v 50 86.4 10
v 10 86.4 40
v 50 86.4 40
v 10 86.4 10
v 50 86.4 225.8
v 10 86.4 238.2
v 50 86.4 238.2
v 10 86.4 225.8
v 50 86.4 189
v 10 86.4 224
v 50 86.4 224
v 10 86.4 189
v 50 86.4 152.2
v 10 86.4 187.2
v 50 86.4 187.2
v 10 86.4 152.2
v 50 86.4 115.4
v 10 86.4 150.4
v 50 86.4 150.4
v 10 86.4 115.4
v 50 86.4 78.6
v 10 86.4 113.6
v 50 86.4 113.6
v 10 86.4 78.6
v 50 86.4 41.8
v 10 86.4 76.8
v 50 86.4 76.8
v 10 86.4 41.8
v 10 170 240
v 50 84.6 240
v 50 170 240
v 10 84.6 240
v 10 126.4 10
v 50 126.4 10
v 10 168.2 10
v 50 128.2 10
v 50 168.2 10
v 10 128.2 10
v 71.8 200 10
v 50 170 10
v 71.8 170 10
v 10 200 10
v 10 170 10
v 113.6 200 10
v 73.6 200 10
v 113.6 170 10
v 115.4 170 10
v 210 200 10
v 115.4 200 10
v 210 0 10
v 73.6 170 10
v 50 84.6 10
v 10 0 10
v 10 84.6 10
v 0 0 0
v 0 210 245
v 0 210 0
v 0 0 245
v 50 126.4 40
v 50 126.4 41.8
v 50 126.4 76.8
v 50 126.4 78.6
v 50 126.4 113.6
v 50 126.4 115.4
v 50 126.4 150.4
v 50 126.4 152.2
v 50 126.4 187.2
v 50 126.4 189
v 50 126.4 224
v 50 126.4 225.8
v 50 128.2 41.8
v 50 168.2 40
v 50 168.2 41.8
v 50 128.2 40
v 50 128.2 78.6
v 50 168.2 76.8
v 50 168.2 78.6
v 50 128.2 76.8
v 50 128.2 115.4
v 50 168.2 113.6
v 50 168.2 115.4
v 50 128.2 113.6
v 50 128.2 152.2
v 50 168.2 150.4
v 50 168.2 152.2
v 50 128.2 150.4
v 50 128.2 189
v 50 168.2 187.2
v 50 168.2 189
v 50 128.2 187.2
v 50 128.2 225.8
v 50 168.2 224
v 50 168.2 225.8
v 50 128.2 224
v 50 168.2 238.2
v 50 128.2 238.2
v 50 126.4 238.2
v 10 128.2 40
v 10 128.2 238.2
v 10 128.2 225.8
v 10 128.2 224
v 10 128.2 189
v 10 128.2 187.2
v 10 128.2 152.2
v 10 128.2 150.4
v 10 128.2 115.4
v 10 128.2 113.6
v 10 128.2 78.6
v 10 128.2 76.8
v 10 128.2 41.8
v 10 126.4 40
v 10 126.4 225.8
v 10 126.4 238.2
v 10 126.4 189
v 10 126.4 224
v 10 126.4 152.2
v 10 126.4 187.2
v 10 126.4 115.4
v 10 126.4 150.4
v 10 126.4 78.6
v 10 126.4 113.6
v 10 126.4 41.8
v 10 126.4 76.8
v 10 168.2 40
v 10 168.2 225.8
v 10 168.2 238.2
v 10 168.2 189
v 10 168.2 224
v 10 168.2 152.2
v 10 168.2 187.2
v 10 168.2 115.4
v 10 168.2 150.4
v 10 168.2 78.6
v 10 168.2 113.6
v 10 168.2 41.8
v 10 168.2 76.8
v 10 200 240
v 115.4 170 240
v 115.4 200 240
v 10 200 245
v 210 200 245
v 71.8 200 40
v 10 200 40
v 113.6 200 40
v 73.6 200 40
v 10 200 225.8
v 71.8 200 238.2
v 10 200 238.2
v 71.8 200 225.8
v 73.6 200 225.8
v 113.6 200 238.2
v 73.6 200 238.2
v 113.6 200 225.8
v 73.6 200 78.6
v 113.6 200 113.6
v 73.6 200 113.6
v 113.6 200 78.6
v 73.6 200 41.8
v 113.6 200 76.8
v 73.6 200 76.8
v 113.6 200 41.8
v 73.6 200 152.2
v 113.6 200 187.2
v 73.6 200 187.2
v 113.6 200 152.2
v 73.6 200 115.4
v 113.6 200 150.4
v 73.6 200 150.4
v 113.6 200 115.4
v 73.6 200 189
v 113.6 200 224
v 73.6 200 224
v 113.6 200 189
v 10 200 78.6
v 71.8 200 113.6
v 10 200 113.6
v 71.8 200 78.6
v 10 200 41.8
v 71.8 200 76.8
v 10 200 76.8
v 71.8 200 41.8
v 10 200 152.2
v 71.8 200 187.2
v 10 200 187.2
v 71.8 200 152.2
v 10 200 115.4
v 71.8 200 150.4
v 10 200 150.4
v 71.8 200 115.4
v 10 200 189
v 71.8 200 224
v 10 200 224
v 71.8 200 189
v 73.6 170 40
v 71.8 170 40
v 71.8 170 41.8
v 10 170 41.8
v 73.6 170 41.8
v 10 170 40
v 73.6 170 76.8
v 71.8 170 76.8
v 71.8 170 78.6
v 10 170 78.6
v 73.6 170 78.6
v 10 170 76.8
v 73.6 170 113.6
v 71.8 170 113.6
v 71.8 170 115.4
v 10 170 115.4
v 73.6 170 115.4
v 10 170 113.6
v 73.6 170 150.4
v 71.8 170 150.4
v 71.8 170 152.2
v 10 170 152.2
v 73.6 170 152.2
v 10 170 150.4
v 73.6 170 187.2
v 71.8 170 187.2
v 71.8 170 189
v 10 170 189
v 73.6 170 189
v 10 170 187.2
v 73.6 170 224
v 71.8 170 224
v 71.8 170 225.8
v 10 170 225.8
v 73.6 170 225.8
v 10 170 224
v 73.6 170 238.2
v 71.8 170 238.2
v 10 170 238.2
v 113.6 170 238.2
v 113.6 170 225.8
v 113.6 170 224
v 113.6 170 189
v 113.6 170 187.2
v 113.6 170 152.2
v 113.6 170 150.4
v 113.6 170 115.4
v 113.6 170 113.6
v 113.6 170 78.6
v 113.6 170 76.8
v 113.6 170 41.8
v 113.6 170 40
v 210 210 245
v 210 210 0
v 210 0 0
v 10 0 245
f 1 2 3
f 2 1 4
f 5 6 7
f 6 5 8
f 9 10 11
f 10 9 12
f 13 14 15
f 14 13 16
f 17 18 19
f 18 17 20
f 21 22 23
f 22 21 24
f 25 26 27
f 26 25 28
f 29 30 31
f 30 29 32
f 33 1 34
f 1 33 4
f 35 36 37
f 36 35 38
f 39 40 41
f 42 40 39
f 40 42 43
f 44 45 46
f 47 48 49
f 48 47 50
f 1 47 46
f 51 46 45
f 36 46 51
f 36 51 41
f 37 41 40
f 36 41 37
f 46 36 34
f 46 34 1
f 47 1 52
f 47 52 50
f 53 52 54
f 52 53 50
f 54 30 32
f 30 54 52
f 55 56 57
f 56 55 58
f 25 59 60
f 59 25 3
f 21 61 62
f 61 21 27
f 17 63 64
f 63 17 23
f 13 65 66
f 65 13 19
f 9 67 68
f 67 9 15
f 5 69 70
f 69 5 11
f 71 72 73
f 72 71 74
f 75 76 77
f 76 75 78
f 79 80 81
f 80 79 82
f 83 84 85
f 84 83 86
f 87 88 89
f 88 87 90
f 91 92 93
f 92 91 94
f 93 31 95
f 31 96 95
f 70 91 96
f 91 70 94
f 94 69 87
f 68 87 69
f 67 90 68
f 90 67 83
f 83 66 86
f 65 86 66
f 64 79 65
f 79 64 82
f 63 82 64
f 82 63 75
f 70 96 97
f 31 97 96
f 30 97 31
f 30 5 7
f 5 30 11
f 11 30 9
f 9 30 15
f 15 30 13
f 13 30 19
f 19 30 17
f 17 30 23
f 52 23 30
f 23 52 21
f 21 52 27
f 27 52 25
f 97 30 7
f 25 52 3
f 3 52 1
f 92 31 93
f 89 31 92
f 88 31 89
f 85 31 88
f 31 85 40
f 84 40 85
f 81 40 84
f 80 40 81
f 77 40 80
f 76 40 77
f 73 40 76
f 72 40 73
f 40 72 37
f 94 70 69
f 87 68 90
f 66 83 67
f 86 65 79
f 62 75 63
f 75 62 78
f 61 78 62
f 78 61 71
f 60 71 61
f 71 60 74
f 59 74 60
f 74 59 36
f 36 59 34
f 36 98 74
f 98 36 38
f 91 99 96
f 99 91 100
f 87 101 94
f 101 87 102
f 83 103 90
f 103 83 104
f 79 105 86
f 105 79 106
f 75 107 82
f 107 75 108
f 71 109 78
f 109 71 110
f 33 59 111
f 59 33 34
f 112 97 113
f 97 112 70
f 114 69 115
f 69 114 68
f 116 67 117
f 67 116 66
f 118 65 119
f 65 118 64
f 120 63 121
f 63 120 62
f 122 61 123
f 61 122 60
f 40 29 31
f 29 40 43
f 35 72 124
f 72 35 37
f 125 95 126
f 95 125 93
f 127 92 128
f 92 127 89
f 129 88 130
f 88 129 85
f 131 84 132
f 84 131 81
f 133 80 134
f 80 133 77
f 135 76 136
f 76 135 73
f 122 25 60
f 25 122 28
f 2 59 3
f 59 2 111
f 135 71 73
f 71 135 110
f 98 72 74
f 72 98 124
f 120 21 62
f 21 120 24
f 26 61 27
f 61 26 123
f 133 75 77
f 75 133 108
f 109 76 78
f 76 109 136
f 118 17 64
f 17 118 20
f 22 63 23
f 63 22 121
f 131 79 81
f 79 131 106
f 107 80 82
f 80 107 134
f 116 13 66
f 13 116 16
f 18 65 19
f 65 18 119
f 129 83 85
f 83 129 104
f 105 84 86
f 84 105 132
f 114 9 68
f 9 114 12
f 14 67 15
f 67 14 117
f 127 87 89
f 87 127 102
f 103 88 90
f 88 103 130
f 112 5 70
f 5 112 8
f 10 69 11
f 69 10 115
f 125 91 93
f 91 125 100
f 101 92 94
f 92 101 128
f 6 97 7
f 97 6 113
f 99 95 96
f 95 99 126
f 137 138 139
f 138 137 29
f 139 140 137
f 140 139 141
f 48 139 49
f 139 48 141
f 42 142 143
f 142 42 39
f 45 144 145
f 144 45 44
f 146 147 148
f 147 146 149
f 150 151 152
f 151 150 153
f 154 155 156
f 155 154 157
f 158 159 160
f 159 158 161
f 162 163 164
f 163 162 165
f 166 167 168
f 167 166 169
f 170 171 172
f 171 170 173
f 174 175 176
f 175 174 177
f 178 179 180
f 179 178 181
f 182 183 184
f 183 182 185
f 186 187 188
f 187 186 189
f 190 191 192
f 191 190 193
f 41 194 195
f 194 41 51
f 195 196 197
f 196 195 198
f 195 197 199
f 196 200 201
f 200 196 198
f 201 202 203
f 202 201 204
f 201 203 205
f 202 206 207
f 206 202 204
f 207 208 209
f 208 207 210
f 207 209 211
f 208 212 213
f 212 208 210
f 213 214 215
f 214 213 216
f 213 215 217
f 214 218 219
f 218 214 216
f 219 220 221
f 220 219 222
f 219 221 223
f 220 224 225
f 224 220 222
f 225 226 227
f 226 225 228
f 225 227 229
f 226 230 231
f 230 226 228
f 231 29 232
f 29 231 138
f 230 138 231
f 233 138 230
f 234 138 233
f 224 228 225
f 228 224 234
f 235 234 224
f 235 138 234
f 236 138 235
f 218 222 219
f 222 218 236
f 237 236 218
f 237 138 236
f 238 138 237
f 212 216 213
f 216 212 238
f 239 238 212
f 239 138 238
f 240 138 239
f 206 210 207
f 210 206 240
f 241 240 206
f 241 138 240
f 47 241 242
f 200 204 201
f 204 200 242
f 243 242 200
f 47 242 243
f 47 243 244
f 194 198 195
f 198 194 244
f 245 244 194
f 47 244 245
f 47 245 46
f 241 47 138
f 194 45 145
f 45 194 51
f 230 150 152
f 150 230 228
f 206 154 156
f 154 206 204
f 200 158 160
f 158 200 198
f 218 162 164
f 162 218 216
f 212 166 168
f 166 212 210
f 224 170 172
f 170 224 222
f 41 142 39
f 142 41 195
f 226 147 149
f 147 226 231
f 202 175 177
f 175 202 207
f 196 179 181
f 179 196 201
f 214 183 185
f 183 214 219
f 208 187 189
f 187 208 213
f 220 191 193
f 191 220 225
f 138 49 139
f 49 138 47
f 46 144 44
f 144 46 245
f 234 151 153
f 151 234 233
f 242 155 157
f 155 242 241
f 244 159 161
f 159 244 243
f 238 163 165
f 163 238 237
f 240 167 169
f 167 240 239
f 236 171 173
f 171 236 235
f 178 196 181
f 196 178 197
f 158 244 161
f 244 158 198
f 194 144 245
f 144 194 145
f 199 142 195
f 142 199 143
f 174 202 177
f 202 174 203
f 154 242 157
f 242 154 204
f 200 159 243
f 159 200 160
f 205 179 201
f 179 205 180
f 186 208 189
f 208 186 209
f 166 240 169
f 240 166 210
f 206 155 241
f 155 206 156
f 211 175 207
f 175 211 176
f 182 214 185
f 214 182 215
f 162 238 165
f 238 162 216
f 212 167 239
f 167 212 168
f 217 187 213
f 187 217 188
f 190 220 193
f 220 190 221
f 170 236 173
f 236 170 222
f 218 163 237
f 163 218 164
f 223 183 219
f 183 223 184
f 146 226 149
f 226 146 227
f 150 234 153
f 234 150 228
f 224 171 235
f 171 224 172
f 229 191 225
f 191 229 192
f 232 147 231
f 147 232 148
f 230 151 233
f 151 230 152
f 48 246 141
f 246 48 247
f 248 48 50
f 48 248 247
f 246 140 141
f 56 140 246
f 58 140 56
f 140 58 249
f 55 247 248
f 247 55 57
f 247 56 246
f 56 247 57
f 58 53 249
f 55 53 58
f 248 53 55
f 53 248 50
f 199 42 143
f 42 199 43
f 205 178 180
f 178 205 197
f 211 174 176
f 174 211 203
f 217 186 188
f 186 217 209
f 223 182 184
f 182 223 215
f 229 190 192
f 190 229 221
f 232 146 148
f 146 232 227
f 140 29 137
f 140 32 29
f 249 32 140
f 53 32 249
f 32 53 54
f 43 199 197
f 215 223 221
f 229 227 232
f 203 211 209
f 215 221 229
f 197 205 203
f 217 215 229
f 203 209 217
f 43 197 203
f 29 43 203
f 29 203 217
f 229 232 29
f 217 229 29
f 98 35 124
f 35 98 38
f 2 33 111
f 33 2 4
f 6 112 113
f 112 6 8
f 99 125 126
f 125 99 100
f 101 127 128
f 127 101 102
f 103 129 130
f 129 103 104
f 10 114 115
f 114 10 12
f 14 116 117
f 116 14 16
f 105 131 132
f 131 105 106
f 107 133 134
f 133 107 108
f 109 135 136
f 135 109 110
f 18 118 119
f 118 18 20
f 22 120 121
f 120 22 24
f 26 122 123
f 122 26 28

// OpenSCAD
translate([0.0, 0.0, 0.0]) color([0.0, 1.0, 0.25]) translate([50.0, 84.6, 10.0]) rotate([0.0, 0.0, 90.0]) union() {
union() {
union() {
translate([0.9, 25.0, 115.0]) cube([1.8, 50.0, 230.0], center = true);
translate([42.699999999999996, 25.0, 115.0]) cube([1.8, 50.0, 230.0], center = true);
translate([84.5, 25.0, 115.0]) cube([1.8, 50.0, 230.0], center = true);
}
translate([42.7, 25.0, 229.1]) cube([85.4, 50.0, 1.8], center = true);
union() {
translate([21.8, 25.0, 30.9]) cube([40.0, 50.0, 1.8], center = true);
translate([63.599999999999994, 25.0, 30.9]) cube([40.0, 50.0, 1.8], center = true);
translate([21.8, 25.0, 67.7]) cube([40.0, 50.0, 1.8], center = true);
translate([63.599999999999994, 25.0, 67.7]) cube([40.0, 50.0, 1.8], center = true);
translate([21.8, 25.0, 104.5]) cube([40.0, 50.0, 1.8], center = true);
translate([63.599999999999994, 25.0, 104.5]) cube([40.0, 50.0, 1.8], center = true);
translate([21.8, 25.0, 141.29999999999998]) cube([40.0, 50.0, 1.8], center = true);
translate([63.599999999999994, 25.0, 141.29999999999998]) cube([40.0, 50.0, 1.8], center = true);
translate([21.8, 25.0, 178.1]) cube([40.0, 50.0, 1.8], center = true);
translate([63.599999999999994, 25.0, 178.1]) cube([40.0, 50.0, 1.8], center = true);
translate([21.8, 25.0, 214.9]) cube([40.0, 50.0, 1.8], center = true);
translate([63.599999999999994, 25.0, 214.9]) cube([40.0, 50.0, 1.8], center = true);
}
}
translate([85.4, 50.0, 0.0]) rotate([0.0, 0.0, -90.0]) union() {
union() {
translate([0.9, 15.0, 115.0]) cube([1.8, 30.0, 230.0], center = true);
translate([72.7, 15.0, 115.0]) cube([1.8, 30.0, 230.0], center = true);
translate([114.5, 15.0, 115.0]) cube([1.8, 30.0, 230.0], center = true);
}
translate([57.7, 15.0, 229.1]) cube([115.4, 30.0, 1.8], center = true);
union() {
translate([57.699999999999996, 15.0, 30.9]) cube([111.8, 30.0, 1.8], center = true);
translate([57.699999999999996, 15.0, 67.7]) cube([111.8, 30.0, 1.8], center = true);
translate([57.699999999999996, 15.0, 104.5]) cube([111.8, 30.0, 1.8], center = true);
translate([57.699999999999996, 15.0, 141.29999999999998]) cube([111.8, 30.0, 1.8], center = true);
translate([57.699999999999996, 15.0, 178.1]) cube([111.8, 30.0, 1.8], center = true);
translate([57.699999999999996, 15.0, 214.9]) cube([111.8, 30.0, 1.8], center = true);
}
}
}
translate([0.0, 0.0, 0.0]) color([0.62, 0.62, 0.62]) difference(){
translate([105.0, 105.0, 122.5]) cube([210.0, 210.0, 245.0], center = true);
translate([110.0, 100.0, 127.5]) cube([200.0, 200.0, 235.0], center = true);
}
